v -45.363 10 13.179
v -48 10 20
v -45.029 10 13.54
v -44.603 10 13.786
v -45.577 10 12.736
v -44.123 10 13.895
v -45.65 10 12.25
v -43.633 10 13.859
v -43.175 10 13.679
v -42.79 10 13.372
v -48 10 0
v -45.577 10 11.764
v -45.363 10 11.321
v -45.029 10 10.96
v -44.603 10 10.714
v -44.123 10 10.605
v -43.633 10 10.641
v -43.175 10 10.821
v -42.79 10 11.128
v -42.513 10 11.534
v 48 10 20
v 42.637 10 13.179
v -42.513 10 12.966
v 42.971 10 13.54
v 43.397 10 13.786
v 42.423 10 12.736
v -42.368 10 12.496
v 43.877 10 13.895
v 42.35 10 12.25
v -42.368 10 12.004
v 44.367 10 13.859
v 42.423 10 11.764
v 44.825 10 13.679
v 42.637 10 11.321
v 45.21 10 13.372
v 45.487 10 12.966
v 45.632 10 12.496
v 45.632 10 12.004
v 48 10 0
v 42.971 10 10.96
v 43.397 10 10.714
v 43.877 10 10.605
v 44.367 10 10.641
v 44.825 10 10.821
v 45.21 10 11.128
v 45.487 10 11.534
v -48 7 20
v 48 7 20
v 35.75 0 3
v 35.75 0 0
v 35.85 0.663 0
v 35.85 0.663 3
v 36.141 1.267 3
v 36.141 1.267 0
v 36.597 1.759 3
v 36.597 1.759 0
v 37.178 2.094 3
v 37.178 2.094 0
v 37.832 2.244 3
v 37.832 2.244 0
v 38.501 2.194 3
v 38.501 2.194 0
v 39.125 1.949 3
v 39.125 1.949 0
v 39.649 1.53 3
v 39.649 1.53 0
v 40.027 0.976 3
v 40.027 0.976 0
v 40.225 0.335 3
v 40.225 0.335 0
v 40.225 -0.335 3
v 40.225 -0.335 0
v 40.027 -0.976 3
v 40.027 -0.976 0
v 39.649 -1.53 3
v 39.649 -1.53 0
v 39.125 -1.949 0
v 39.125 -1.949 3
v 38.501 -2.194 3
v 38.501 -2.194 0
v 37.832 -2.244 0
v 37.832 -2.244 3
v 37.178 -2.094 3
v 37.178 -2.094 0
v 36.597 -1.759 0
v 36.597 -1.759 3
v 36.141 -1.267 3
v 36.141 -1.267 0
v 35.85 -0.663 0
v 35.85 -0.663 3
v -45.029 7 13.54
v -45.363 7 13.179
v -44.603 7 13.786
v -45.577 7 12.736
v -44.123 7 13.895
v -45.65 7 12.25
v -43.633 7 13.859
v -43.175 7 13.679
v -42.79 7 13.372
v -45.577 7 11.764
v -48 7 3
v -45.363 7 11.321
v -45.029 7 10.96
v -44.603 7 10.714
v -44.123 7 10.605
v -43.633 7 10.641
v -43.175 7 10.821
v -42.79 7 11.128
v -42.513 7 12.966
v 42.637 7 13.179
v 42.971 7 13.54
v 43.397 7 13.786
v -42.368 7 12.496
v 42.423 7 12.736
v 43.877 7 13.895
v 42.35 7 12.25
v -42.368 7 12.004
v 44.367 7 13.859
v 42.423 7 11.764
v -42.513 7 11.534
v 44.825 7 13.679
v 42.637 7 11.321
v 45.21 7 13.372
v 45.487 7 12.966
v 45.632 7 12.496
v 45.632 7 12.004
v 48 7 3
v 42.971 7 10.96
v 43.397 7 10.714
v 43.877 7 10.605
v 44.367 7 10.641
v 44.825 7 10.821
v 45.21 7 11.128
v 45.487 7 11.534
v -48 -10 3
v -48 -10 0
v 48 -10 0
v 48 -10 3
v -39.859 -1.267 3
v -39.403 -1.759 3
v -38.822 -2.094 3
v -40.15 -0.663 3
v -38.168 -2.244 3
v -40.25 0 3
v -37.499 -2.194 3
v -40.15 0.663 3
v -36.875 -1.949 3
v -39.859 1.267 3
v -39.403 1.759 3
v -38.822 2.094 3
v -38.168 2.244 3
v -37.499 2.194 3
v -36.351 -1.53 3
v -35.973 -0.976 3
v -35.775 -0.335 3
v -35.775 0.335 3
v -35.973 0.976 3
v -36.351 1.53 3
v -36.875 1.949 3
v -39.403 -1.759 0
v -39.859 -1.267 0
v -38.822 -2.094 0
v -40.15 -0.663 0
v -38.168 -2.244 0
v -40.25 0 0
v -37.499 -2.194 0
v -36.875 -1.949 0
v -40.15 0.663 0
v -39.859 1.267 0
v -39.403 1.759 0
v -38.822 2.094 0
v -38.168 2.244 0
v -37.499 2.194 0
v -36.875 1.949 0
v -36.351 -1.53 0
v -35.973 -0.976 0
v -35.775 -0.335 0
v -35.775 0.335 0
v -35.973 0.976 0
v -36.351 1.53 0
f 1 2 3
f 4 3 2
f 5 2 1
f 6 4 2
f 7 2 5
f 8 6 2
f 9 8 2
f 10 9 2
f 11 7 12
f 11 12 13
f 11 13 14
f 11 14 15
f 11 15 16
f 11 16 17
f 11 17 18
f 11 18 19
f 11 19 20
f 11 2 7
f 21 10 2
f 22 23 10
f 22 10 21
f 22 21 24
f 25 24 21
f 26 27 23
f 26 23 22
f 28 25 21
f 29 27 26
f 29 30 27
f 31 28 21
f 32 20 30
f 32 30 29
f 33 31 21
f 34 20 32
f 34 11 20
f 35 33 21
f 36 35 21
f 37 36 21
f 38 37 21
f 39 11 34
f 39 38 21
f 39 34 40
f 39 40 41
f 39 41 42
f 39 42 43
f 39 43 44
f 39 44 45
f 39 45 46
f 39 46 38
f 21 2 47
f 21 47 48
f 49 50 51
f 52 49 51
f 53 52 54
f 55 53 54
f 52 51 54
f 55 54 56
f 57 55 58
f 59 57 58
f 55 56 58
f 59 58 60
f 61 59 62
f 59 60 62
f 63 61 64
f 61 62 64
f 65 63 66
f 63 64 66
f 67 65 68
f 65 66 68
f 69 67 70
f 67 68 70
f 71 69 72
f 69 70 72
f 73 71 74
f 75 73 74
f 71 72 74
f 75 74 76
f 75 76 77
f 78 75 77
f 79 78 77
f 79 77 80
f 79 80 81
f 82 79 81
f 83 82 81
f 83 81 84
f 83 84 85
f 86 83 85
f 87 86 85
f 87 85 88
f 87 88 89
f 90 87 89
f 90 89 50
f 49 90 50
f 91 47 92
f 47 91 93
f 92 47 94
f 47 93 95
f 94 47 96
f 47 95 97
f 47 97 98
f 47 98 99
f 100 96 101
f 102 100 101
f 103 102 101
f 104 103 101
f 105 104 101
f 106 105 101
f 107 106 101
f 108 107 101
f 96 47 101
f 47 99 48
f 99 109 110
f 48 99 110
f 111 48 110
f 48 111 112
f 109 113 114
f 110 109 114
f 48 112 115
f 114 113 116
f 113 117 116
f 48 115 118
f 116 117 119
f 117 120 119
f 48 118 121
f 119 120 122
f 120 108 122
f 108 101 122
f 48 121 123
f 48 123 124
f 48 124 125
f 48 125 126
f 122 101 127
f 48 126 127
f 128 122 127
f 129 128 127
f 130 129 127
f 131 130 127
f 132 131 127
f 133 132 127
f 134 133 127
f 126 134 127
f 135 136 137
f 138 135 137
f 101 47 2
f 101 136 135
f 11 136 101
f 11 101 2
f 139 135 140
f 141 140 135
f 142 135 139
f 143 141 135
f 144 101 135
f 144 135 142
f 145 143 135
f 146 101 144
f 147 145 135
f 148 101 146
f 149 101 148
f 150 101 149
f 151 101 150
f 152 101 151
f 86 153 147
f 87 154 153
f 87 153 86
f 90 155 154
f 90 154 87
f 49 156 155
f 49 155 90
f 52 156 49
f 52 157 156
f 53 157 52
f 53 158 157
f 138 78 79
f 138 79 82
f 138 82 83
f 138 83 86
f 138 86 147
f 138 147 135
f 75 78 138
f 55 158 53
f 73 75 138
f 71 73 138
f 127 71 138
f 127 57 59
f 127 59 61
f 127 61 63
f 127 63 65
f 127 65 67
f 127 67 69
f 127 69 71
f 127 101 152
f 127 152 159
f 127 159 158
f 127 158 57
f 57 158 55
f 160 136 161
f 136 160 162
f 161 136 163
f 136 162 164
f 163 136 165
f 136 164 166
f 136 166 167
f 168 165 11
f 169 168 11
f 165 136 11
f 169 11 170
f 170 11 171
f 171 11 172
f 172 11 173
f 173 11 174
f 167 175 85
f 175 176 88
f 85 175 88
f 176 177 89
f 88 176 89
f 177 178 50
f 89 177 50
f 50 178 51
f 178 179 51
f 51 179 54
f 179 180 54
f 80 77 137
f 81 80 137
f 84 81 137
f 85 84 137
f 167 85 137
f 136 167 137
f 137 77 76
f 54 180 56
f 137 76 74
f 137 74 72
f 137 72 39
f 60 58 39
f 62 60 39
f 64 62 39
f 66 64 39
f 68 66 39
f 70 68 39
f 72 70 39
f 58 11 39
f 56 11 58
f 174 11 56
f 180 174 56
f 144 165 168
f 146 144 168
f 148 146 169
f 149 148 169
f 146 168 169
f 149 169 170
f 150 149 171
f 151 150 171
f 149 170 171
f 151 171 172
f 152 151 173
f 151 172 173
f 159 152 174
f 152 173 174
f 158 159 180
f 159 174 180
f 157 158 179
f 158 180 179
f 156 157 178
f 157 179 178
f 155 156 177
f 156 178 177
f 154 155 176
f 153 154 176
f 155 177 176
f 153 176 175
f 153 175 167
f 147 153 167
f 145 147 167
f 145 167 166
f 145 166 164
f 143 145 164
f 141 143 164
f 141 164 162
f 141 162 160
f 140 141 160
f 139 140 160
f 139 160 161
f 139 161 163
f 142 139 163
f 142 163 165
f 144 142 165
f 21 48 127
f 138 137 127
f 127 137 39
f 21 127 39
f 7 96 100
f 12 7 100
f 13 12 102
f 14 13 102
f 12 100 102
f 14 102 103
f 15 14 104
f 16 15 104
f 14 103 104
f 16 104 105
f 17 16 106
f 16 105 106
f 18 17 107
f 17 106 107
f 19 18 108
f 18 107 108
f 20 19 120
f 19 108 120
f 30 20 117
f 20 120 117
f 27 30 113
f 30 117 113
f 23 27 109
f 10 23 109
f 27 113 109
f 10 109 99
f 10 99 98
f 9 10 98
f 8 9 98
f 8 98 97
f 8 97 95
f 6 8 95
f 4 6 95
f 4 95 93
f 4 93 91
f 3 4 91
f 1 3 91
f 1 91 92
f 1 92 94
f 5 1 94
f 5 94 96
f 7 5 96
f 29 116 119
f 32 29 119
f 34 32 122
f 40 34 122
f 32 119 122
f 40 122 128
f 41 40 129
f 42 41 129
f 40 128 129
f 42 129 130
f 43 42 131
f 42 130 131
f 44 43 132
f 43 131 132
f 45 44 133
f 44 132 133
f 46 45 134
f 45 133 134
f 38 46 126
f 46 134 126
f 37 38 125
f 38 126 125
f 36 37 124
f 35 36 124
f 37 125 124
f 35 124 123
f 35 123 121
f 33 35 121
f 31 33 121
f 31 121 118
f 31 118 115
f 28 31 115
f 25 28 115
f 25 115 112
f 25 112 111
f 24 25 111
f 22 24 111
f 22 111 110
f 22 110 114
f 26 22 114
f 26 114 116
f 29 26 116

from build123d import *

# Parameters (mm, degrees)
SKETCH_1_W           = 96
SKETCH_1_H           = 20
EXTRUDE_1_DEPTH      = 3
SKETCH_2_W           = 96
SKETCH_2_H           = 3
EXTRUDE_2_DEPTH      = 17
HOLE_WIZARD_M4_1_D   = 4.5
HOLE_WIZARD_M4_1_2_D = 3.3


with BuildPart() as part:
    # 스케치1 → 보스-돌출1 (new body)
    with BuildSketch(Plane.XY):
        Rectangle(SKETCH_1_W, SKETCH_1_H)
    extrude(amount=EXTRUDE_1_DEPTH)

    # 스케치2 → 보스-돌출2 (add)
    with BuildSketch(Plane.XY.offset(3)):
        with Locations((0, 8.5)):
            Rectangle(SKETCH_2_W, SKETCH_2_H)
    extrude(amount=EXTRUDE_2_DEPTH)

    # Hole Wizard M4 _ _1 (through all)
    with Locations(Plane.XY.offset(3)):
        with Locations((-38, 0), (38, 0)):
            Hole(HOLE_WIZARD_M4_1_D / 2)

    # Hole Wizard M4 _ _1 2 (through all)
    with Locations(Plane(origin=(0, 10, 0), x_dir=(1, 0, 0), z_dir=(0, 1, 0))):
        with Locations((-44, -12.25), (44, -12.25)):
            Hole(HOLE_WIZARD_M4_1_2_D / 2)


solid = part.part
